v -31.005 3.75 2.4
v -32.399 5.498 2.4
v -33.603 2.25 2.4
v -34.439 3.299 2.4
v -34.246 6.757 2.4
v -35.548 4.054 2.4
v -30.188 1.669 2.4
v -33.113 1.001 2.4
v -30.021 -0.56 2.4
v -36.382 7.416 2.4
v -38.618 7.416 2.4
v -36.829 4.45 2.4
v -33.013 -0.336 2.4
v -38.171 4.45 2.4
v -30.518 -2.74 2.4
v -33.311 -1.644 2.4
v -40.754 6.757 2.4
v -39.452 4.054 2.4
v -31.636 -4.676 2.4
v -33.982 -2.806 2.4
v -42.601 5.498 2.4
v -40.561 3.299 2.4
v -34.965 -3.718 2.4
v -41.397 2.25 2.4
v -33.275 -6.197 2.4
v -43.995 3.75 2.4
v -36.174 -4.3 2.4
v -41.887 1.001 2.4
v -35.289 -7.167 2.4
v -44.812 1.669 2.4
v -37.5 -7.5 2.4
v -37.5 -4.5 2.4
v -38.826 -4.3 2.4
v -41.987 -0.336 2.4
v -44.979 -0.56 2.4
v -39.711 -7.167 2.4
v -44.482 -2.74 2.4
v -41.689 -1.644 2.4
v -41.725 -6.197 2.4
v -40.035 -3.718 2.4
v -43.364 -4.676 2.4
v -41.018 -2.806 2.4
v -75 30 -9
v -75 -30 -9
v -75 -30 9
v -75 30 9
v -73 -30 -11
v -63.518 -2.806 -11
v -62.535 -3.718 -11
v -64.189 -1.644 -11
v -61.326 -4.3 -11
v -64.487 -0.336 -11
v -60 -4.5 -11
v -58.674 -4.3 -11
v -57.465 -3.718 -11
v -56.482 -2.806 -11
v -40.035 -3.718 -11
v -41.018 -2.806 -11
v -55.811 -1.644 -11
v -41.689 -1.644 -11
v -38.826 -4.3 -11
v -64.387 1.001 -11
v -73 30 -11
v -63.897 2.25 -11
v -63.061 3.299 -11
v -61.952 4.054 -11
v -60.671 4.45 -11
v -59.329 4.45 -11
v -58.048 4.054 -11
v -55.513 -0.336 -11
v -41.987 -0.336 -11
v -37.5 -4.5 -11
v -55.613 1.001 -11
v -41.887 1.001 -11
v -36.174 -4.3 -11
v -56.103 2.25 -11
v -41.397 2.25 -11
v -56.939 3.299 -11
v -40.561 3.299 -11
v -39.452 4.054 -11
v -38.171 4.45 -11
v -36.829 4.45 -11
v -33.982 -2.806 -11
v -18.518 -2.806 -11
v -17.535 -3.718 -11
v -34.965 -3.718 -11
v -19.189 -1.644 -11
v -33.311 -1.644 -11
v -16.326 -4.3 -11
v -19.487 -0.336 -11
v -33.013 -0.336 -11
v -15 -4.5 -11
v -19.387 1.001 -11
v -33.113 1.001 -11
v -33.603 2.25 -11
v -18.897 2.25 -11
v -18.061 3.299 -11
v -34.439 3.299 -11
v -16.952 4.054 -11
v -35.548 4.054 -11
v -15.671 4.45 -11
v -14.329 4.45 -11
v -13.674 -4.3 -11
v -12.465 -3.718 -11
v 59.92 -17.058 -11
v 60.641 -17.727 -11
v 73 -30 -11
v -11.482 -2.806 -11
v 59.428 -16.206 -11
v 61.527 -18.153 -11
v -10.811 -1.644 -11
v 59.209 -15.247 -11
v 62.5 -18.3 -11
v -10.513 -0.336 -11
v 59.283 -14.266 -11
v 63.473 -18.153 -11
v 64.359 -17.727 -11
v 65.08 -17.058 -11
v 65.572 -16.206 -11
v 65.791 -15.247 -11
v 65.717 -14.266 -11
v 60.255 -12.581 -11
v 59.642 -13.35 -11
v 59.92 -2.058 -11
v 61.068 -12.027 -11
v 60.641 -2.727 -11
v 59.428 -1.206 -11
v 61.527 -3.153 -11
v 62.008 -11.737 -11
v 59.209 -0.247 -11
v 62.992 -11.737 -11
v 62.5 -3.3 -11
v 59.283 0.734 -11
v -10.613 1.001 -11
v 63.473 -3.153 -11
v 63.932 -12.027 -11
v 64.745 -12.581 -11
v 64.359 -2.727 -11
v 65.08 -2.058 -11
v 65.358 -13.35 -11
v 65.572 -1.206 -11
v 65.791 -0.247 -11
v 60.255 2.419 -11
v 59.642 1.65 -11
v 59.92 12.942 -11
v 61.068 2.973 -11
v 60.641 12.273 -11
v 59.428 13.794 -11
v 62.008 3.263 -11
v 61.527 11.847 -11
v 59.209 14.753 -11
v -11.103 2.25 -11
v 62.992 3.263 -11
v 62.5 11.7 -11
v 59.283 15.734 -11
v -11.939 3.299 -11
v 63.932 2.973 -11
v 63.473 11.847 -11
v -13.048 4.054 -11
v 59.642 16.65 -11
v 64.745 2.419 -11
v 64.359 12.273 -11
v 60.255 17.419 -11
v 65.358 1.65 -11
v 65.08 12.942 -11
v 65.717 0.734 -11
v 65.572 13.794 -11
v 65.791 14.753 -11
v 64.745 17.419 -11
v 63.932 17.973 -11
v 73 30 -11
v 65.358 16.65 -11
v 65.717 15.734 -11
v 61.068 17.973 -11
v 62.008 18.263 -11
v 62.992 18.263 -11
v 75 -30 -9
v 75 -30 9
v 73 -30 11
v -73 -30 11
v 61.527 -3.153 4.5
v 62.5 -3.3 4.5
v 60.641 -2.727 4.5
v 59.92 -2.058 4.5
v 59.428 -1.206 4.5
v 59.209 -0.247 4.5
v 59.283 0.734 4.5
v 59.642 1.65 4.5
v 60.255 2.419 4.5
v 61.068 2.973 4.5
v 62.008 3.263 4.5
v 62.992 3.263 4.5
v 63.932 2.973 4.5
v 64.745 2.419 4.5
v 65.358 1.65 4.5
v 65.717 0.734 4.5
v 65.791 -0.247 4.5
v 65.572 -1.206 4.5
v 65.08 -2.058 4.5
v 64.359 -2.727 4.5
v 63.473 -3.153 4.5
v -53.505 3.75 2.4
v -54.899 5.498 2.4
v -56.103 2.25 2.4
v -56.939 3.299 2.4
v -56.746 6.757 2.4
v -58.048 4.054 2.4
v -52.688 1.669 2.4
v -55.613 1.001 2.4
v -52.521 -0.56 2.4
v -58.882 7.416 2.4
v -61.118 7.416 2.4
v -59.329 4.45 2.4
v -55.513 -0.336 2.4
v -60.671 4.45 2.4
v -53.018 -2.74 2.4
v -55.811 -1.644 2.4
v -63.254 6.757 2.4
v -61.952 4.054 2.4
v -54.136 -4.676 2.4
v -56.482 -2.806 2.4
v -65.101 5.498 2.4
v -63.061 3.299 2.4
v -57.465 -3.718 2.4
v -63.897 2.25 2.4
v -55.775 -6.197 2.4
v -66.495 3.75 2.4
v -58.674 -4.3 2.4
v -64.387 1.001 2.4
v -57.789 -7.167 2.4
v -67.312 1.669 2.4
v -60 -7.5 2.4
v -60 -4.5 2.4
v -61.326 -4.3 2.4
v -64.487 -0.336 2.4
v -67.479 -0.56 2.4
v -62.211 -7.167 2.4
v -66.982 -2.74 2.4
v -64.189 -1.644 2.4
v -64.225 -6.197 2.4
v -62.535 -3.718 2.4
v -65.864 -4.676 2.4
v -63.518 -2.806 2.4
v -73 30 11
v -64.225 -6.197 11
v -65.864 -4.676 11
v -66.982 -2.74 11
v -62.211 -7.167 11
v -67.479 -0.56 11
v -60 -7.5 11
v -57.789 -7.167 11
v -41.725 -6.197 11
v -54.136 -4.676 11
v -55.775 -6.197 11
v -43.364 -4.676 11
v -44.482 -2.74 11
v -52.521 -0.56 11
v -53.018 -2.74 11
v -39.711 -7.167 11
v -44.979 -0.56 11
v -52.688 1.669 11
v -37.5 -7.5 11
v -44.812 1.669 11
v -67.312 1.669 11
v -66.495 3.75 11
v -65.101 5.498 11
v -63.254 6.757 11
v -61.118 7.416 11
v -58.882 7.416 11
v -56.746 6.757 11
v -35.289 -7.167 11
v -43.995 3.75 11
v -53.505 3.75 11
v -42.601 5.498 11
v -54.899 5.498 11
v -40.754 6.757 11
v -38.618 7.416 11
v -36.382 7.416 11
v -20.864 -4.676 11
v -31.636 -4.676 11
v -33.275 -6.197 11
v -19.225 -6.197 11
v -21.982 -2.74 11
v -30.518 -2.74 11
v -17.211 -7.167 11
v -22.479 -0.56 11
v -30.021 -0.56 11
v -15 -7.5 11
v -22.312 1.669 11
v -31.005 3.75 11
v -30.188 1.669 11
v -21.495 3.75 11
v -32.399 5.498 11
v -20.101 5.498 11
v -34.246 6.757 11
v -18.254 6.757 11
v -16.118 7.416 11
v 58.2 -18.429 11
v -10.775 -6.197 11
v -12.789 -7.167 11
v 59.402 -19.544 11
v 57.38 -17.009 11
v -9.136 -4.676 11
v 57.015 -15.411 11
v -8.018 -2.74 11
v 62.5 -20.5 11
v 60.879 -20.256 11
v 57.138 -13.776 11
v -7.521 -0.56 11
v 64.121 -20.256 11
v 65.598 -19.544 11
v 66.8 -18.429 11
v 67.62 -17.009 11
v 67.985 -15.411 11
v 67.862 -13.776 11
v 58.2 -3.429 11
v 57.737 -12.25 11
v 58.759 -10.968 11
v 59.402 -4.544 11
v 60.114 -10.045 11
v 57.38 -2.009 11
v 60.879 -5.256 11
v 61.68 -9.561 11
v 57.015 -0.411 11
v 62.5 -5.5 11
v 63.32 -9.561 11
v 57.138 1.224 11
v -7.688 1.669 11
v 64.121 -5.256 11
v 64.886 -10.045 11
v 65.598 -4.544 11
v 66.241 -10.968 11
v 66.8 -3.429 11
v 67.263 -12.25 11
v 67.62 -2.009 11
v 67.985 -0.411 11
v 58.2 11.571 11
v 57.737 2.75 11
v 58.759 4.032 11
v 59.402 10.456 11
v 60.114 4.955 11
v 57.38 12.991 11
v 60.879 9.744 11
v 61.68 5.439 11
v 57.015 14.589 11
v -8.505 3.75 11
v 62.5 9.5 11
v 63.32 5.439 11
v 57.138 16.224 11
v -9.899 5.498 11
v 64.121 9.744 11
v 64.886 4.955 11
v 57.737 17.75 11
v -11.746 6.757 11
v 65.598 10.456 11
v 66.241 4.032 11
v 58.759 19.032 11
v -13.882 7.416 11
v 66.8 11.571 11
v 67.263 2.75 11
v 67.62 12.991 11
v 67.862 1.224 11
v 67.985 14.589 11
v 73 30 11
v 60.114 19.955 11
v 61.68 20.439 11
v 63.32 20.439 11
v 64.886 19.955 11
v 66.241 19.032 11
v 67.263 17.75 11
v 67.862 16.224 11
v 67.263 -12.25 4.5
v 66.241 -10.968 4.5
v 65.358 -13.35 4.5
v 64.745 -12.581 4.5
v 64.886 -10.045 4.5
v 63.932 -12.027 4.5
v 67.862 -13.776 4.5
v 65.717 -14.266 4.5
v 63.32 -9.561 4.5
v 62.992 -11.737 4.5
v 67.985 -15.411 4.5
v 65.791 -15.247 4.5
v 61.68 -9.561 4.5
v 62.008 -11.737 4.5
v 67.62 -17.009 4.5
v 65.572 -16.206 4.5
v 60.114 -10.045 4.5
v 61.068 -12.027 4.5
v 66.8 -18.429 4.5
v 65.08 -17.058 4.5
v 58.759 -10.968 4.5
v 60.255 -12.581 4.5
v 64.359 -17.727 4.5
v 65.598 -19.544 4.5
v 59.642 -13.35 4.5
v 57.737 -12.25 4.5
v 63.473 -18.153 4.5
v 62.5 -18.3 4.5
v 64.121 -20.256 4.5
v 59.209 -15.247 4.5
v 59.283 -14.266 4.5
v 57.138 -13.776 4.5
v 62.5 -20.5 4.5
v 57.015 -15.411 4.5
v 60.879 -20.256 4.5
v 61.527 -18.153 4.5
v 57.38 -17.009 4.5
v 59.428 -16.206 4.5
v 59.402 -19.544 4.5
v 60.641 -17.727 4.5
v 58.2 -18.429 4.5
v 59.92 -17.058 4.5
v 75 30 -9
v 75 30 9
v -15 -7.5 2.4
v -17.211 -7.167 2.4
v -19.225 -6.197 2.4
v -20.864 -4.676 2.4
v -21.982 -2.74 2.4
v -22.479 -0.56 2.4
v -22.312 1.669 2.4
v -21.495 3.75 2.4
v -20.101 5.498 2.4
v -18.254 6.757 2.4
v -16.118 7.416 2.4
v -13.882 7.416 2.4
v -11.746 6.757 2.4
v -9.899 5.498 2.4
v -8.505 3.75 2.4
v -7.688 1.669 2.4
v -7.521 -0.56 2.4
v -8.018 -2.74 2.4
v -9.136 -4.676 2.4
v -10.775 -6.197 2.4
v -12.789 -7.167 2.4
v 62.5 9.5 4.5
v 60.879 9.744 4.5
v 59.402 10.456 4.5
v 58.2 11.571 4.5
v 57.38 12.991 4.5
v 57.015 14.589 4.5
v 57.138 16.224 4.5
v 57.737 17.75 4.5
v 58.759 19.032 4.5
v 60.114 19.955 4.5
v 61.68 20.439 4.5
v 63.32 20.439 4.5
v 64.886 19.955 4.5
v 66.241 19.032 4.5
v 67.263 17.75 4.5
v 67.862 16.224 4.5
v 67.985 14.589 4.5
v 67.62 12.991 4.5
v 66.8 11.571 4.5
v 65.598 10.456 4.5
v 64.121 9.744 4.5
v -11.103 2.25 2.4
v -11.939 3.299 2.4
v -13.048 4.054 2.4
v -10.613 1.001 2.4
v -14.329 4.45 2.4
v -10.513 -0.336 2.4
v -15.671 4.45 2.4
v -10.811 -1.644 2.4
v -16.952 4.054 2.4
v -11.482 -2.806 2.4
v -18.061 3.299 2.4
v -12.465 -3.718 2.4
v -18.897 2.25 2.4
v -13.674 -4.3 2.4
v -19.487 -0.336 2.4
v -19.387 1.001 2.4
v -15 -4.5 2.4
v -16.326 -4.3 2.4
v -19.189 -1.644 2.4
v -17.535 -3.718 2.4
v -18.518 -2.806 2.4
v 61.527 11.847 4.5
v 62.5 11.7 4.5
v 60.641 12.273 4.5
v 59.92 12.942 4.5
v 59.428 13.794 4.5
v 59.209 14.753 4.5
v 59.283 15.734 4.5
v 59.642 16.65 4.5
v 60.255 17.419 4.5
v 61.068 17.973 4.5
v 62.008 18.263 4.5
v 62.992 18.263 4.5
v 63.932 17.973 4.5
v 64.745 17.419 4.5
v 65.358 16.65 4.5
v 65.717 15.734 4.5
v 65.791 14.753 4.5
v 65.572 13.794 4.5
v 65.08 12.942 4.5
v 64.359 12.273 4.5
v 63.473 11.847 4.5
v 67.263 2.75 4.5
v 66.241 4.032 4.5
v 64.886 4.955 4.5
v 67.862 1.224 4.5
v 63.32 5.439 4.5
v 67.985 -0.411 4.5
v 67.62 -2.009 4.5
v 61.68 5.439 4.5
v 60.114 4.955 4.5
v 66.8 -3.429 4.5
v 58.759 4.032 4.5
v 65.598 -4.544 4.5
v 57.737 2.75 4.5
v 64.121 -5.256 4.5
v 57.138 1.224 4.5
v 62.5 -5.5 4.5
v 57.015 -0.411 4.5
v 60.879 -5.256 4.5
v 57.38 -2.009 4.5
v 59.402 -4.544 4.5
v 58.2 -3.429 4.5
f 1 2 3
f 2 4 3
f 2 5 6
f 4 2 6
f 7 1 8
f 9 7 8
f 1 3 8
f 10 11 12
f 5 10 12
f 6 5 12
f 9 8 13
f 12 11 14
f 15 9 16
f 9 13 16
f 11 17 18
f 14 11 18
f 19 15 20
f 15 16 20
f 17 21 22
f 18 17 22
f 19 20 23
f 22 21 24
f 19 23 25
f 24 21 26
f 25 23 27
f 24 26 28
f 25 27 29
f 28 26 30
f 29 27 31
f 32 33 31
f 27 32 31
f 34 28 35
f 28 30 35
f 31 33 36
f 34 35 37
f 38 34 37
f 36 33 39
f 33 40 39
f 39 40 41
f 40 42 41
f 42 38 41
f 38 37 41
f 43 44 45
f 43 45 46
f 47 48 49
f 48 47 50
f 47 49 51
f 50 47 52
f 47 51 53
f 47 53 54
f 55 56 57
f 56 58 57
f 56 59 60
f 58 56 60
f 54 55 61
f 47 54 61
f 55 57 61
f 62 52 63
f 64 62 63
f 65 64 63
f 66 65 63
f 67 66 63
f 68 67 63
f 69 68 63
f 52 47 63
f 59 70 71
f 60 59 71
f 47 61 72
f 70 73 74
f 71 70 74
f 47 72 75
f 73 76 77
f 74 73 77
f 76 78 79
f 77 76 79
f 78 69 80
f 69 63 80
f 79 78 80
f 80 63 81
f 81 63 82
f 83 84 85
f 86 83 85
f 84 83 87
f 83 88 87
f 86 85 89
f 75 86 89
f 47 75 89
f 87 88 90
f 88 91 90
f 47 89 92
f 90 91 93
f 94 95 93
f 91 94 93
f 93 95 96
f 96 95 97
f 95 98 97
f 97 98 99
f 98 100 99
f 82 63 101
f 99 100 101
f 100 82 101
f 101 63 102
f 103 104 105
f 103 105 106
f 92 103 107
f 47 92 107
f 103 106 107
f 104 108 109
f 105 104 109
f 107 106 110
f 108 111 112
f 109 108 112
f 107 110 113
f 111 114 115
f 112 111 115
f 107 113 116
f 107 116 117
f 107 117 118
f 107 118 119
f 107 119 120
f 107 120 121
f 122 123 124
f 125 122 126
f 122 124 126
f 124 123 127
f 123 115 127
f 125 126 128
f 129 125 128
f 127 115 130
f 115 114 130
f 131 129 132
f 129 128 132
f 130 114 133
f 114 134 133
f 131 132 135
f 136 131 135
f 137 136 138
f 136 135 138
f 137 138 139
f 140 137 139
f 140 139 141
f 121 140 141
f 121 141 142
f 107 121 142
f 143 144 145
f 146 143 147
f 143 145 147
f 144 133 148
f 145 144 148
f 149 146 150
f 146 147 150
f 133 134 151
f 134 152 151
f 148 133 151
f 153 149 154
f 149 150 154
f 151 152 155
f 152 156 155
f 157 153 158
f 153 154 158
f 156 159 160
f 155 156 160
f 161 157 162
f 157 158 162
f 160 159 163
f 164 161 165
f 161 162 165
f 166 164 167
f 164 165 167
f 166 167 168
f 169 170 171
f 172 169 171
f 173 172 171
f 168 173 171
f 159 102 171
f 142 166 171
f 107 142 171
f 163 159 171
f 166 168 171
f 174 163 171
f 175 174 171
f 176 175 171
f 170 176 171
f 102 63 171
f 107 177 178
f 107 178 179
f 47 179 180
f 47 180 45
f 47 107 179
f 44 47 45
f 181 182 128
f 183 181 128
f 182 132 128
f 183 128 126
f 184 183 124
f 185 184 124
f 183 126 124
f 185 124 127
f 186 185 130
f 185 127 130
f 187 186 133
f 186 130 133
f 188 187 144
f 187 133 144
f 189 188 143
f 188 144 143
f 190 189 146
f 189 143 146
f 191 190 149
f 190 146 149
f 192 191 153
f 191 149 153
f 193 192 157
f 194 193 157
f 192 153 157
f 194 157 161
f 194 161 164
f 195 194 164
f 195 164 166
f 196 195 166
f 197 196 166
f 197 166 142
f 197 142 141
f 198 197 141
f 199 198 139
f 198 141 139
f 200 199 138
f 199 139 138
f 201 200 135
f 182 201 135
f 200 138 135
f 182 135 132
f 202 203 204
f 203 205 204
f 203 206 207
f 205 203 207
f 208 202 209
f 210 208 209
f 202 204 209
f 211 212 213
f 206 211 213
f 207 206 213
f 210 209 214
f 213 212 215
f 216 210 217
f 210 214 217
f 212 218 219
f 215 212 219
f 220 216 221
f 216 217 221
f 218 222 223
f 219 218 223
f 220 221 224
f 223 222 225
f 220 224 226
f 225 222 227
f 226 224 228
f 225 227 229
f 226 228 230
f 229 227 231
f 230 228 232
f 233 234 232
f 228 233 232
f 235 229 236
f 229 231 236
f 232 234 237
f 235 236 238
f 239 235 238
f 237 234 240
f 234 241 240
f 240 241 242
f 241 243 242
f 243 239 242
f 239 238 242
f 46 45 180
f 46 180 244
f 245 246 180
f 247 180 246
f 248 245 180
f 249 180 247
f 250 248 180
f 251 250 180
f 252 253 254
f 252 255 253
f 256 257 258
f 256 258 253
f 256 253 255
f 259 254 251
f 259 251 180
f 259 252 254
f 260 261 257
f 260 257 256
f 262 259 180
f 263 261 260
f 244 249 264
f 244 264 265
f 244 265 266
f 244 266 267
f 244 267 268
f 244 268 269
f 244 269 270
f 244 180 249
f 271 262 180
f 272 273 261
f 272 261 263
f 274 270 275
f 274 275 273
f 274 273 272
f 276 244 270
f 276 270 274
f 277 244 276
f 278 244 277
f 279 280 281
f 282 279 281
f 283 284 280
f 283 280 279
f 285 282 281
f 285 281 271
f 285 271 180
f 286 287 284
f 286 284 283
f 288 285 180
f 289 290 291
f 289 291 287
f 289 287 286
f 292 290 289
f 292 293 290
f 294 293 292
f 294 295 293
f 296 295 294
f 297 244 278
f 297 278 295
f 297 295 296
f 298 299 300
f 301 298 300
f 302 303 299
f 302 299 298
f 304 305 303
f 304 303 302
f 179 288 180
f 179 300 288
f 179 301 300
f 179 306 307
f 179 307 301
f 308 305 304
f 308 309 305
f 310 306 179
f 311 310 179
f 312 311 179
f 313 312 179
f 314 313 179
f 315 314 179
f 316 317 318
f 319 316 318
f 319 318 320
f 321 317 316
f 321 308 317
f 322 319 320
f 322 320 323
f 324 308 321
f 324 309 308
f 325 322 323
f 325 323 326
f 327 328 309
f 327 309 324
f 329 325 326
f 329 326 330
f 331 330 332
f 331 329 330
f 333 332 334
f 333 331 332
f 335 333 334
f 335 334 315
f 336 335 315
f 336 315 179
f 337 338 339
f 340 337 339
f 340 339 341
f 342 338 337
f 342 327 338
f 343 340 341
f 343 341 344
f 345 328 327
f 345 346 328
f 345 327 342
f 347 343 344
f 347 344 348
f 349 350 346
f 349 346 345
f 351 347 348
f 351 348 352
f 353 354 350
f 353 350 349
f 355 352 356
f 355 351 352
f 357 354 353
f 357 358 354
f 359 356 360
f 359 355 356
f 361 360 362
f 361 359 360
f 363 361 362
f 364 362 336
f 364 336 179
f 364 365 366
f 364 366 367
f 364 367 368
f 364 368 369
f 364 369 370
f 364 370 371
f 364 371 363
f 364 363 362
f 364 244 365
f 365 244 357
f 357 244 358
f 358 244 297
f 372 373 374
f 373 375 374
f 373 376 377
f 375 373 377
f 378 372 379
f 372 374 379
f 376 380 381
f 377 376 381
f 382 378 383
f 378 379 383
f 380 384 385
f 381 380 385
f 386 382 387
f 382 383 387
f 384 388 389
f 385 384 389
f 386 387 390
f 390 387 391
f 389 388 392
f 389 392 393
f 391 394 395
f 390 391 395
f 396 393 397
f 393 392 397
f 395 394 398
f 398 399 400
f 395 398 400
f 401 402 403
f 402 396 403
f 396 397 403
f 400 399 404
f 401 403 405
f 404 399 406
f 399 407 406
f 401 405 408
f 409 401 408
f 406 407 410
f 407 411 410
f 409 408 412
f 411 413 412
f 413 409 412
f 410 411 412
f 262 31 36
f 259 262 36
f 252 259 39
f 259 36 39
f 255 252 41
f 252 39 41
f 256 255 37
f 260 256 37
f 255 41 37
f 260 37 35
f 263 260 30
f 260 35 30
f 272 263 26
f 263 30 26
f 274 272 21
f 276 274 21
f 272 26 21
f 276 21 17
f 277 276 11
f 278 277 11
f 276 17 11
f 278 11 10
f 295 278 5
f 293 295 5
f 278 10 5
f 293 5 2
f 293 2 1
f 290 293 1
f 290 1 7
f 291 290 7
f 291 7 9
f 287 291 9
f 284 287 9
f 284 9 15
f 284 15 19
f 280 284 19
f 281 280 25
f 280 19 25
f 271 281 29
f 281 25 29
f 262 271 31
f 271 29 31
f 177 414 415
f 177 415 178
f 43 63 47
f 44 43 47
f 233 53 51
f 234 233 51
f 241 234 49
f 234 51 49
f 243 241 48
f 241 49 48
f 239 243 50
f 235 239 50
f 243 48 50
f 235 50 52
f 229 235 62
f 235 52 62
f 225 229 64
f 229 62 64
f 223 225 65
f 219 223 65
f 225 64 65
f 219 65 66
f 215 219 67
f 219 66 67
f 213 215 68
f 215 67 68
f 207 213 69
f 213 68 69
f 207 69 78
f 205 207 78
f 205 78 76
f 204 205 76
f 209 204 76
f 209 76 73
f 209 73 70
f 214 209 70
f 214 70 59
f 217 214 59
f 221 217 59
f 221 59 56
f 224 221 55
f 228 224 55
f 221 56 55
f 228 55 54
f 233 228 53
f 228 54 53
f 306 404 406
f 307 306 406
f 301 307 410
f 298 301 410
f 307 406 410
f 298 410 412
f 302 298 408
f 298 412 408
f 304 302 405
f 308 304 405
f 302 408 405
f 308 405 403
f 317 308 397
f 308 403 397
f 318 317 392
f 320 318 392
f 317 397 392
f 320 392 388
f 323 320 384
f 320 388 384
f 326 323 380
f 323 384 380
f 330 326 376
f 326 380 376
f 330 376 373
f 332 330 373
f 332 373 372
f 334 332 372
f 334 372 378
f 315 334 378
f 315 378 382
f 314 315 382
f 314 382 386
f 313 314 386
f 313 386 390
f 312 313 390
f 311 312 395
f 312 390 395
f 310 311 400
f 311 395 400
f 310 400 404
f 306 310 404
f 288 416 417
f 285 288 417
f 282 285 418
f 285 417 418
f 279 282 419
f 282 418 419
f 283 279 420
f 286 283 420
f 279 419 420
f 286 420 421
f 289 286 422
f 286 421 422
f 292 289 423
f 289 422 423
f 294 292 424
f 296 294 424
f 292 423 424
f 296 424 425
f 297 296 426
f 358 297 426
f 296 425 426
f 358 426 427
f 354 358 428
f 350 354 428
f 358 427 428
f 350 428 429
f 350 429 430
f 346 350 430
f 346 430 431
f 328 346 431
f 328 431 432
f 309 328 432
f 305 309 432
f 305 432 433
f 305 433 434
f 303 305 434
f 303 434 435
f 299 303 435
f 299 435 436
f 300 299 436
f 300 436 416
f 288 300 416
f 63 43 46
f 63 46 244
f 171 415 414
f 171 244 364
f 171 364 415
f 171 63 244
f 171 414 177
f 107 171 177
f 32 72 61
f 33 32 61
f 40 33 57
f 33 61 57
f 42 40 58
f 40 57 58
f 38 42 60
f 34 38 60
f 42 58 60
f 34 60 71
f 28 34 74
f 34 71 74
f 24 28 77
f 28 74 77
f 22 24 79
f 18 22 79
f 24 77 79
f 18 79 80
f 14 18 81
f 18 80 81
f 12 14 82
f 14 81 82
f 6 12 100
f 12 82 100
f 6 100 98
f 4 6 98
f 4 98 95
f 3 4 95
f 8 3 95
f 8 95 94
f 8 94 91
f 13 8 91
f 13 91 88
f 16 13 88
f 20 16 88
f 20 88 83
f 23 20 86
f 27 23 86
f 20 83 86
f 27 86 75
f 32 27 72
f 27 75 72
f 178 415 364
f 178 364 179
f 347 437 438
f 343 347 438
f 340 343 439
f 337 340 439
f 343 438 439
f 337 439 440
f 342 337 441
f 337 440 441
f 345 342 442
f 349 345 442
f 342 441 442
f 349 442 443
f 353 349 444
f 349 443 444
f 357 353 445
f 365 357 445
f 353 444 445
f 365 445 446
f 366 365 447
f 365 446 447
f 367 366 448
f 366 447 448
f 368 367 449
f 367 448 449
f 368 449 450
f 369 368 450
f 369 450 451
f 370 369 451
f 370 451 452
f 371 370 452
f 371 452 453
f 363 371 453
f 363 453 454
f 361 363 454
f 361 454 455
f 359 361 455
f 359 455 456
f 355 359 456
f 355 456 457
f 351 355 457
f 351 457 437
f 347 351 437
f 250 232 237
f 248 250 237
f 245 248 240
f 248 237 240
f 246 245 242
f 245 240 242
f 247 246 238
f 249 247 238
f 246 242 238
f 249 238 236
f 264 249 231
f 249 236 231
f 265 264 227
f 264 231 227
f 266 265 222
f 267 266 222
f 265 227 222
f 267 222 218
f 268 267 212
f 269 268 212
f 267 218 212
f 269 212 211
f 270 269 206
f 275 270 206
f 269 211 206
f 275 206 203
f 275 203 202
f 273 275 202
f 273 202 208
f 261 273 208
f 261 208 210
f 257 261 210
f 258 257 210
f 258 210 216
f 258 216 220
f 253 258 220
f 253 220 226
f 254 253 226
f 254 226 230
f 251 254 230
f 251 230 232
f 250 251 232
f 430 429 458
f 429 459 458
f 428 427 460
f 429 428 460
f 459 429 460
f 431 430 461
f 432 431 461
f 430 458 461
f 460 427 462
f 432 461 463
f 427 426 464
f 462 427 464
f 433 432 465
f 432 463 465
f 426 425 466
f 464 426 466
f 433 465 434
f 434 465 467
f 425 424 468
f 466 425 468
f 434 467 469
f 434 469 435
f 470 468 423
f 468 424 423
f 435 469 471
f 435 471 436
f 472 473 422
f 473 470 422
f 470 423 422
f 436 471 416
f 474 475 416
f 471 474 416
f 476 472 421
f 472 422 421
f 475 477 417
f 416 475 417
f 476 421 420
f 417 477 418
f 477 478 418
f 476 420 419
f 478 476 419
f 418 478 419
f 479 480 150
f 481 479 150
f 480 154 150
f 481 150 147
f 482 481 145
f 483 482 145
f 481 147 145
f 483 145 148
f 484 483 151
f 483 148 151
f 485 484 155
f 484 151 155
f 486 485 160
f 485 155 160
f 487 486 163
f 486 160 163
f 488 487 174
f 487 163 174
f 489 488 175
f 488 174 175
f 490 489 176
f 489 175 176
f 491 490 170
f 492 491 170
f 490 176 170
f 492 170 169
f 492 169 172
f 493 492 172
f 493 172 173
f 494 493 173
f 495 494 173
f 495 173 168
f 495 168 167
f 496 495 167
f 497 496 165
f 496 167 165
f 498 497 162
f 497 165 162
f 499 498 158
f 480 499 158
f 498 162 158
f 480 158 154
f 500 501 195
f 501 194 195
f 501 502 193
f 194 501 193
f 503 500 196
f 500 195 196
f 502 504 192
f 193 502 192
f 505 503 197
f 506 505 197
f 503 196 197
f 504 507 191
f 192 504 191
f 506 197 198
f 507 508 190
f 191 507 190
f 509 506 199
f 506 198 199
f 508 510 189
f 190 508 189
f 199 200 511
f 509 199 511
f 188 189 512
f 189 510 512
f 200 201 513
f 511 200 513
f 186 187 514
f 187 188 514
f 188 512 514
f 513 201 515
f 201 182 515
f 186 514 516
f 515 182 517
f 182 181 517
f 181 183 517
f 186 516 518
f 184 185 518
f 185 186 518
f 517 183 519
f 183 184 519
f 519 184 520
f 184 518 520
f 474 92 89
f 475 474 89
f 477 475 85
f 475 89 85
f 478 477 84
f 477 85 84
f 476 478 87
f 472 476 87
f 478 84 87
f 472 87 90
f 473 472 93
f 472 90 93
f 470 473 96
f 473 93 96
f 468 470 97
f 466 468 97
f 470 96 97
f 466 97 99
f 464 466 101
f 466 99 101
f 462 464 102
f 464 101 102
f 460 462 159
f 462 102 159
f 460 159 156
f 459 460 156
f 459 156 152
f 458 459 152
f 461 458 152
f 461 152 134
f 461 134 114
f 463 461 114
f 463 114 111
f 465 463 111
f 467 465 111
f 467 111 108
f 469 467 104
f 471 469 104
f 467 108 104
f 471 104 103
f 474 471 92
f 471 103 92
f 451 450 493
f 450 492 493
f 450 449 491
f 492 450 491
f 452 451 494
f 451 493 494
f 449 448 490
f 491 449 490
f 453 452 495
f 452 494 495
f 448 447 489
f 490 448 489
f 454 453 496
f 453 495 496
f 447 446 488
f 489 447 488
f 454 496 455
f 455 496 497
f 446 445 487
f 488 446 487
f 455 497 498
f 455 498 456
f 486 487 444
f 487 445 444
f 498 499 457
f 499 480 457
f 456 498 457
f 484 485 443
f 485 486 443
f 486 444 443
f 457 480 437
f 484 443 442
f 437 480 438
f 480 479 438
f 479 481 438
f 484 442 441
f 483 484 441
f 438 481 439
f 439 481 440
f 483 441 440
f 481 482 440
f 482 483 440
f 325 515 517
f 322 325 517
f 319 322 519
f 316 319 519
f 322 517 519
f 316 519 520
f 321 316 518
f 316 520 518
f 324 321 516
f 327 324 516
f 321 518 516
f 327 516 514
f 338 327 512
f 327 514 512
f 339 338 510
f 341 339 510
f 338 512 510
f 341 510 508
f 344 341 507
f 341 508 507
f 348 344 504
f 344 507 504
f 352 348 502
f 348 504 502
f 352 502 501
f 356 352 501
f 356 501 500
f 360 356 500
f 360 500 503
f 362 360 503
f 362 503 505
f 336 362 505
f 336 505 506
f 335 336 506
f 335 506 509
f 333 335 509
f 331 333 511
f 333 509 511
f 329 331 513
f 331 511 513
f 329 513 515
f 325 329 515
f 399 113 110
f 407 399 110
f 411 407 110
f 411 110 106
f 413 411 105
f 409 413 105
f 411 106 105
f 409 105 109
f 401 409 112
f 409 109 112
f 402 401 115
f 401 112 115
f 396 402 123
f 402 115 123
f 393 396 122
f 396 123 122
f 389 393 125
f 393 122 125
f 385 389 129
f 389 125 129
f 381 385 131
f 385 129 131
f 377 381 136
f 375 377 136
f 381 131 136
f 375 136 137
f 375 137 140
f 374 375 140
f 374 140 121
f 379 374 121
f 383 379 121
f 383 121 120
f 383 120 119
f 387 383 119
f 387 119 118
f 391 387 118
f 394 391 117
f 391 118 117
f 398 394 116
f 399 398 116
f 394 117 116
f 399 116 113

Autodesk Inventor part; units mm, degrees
ref_plane "YZ Plane" through (0, 0, 0) normal (1, 0, 0) x (0, 1, 0)
ref_plane "XZ Plane" through (0, 0, 0) normal (0, 1, 0) x (-1, 0, 0)
ref_plane "XY Plane" through (0, 0, 0) normal (0, 0, 1) x (1, 0, 0)
sketch "Sketch2" plane through (0, 0, 0) normal (0, 0, 1) x (1, 0, 0)
  line L0 (75, -30) -> (-75, -30)
  line L1 (-75, -30) -> (-75, 30)
  line L2 (-75, 30) -> (75, 30)
  line L3 (75, 30) -> (75, -30)
  line L4 (75, -30) -> (-75, 30) construction
  line L5 (-75, -30) -> (75, 30) construction
  point P0 (0, 0)
  dimension "d1" = 150
  dimension "d2" = 60
extrude "Extrusion1" add sketch "Sketch2" along normal mid plane 22
sketch "Sketch3" plane through (0, 0, 11) normal (0, 0, 1) x (1, 0, 0)
  line L0 (75, -30) -> (75, 30) projected
  point P0 (0, 0)
  point P1 (62.5, 0)
  point P2 (62.5, 15)
  point P3 (62.5, -15)
  point P4 (75, 0)
  dimension "d5" = 12.5
  dimension "d6" = 30
  dimension "d7" = 15
hole "Hole1" at (62.5, 0, 11) at (62.5, 15, 11) at (62.5, -15, 11) direction (0, 0, -1) diameter 6.6 end through all counterbore diameter 11 counterbore depth 6.5 clearance for "Socket Head Cap Screw" size "M6" standard "TS Profile"
sketch "Sketch4" plane through (0, 0, 11) normal (0, 0, 1) x (1, 0, 0)
  line L0 (-75, 30) -> (-75, -30) projected
  point P0 (0, 0)
  point P1 (-60, 0)
  point P2 (-37.5, 0)
  point P3 (-15, 0)
  point P4 (-75, 0)
  point P5 (-75, 0)
  dimension "d15" = 15
  dimension "d16" = 22.5
  dimension "d17" = 22.5
hole "Hole2" at (-60, 0, 11) at (-37.5, 0, 11) at (-15, 0, 11) direction (0, 0, -1) diameter 9 end through all counterbore diameter 15 counterbore depth 8.6 clearance for "Socket Head Cap Screw" size "M8" standard "TS Profile"
chamfer "Chamfer2" distance 2 angle 45 4 edges at (75, 0, 11) (75, 0, -11) (-75, 0, 11) (-75, 0, -11)
equation "\"d7\" = 0.5 * d6"
equation "\"d17\" = d16"
properties part number "TL20240901-10320CV-021" material "SS400"
